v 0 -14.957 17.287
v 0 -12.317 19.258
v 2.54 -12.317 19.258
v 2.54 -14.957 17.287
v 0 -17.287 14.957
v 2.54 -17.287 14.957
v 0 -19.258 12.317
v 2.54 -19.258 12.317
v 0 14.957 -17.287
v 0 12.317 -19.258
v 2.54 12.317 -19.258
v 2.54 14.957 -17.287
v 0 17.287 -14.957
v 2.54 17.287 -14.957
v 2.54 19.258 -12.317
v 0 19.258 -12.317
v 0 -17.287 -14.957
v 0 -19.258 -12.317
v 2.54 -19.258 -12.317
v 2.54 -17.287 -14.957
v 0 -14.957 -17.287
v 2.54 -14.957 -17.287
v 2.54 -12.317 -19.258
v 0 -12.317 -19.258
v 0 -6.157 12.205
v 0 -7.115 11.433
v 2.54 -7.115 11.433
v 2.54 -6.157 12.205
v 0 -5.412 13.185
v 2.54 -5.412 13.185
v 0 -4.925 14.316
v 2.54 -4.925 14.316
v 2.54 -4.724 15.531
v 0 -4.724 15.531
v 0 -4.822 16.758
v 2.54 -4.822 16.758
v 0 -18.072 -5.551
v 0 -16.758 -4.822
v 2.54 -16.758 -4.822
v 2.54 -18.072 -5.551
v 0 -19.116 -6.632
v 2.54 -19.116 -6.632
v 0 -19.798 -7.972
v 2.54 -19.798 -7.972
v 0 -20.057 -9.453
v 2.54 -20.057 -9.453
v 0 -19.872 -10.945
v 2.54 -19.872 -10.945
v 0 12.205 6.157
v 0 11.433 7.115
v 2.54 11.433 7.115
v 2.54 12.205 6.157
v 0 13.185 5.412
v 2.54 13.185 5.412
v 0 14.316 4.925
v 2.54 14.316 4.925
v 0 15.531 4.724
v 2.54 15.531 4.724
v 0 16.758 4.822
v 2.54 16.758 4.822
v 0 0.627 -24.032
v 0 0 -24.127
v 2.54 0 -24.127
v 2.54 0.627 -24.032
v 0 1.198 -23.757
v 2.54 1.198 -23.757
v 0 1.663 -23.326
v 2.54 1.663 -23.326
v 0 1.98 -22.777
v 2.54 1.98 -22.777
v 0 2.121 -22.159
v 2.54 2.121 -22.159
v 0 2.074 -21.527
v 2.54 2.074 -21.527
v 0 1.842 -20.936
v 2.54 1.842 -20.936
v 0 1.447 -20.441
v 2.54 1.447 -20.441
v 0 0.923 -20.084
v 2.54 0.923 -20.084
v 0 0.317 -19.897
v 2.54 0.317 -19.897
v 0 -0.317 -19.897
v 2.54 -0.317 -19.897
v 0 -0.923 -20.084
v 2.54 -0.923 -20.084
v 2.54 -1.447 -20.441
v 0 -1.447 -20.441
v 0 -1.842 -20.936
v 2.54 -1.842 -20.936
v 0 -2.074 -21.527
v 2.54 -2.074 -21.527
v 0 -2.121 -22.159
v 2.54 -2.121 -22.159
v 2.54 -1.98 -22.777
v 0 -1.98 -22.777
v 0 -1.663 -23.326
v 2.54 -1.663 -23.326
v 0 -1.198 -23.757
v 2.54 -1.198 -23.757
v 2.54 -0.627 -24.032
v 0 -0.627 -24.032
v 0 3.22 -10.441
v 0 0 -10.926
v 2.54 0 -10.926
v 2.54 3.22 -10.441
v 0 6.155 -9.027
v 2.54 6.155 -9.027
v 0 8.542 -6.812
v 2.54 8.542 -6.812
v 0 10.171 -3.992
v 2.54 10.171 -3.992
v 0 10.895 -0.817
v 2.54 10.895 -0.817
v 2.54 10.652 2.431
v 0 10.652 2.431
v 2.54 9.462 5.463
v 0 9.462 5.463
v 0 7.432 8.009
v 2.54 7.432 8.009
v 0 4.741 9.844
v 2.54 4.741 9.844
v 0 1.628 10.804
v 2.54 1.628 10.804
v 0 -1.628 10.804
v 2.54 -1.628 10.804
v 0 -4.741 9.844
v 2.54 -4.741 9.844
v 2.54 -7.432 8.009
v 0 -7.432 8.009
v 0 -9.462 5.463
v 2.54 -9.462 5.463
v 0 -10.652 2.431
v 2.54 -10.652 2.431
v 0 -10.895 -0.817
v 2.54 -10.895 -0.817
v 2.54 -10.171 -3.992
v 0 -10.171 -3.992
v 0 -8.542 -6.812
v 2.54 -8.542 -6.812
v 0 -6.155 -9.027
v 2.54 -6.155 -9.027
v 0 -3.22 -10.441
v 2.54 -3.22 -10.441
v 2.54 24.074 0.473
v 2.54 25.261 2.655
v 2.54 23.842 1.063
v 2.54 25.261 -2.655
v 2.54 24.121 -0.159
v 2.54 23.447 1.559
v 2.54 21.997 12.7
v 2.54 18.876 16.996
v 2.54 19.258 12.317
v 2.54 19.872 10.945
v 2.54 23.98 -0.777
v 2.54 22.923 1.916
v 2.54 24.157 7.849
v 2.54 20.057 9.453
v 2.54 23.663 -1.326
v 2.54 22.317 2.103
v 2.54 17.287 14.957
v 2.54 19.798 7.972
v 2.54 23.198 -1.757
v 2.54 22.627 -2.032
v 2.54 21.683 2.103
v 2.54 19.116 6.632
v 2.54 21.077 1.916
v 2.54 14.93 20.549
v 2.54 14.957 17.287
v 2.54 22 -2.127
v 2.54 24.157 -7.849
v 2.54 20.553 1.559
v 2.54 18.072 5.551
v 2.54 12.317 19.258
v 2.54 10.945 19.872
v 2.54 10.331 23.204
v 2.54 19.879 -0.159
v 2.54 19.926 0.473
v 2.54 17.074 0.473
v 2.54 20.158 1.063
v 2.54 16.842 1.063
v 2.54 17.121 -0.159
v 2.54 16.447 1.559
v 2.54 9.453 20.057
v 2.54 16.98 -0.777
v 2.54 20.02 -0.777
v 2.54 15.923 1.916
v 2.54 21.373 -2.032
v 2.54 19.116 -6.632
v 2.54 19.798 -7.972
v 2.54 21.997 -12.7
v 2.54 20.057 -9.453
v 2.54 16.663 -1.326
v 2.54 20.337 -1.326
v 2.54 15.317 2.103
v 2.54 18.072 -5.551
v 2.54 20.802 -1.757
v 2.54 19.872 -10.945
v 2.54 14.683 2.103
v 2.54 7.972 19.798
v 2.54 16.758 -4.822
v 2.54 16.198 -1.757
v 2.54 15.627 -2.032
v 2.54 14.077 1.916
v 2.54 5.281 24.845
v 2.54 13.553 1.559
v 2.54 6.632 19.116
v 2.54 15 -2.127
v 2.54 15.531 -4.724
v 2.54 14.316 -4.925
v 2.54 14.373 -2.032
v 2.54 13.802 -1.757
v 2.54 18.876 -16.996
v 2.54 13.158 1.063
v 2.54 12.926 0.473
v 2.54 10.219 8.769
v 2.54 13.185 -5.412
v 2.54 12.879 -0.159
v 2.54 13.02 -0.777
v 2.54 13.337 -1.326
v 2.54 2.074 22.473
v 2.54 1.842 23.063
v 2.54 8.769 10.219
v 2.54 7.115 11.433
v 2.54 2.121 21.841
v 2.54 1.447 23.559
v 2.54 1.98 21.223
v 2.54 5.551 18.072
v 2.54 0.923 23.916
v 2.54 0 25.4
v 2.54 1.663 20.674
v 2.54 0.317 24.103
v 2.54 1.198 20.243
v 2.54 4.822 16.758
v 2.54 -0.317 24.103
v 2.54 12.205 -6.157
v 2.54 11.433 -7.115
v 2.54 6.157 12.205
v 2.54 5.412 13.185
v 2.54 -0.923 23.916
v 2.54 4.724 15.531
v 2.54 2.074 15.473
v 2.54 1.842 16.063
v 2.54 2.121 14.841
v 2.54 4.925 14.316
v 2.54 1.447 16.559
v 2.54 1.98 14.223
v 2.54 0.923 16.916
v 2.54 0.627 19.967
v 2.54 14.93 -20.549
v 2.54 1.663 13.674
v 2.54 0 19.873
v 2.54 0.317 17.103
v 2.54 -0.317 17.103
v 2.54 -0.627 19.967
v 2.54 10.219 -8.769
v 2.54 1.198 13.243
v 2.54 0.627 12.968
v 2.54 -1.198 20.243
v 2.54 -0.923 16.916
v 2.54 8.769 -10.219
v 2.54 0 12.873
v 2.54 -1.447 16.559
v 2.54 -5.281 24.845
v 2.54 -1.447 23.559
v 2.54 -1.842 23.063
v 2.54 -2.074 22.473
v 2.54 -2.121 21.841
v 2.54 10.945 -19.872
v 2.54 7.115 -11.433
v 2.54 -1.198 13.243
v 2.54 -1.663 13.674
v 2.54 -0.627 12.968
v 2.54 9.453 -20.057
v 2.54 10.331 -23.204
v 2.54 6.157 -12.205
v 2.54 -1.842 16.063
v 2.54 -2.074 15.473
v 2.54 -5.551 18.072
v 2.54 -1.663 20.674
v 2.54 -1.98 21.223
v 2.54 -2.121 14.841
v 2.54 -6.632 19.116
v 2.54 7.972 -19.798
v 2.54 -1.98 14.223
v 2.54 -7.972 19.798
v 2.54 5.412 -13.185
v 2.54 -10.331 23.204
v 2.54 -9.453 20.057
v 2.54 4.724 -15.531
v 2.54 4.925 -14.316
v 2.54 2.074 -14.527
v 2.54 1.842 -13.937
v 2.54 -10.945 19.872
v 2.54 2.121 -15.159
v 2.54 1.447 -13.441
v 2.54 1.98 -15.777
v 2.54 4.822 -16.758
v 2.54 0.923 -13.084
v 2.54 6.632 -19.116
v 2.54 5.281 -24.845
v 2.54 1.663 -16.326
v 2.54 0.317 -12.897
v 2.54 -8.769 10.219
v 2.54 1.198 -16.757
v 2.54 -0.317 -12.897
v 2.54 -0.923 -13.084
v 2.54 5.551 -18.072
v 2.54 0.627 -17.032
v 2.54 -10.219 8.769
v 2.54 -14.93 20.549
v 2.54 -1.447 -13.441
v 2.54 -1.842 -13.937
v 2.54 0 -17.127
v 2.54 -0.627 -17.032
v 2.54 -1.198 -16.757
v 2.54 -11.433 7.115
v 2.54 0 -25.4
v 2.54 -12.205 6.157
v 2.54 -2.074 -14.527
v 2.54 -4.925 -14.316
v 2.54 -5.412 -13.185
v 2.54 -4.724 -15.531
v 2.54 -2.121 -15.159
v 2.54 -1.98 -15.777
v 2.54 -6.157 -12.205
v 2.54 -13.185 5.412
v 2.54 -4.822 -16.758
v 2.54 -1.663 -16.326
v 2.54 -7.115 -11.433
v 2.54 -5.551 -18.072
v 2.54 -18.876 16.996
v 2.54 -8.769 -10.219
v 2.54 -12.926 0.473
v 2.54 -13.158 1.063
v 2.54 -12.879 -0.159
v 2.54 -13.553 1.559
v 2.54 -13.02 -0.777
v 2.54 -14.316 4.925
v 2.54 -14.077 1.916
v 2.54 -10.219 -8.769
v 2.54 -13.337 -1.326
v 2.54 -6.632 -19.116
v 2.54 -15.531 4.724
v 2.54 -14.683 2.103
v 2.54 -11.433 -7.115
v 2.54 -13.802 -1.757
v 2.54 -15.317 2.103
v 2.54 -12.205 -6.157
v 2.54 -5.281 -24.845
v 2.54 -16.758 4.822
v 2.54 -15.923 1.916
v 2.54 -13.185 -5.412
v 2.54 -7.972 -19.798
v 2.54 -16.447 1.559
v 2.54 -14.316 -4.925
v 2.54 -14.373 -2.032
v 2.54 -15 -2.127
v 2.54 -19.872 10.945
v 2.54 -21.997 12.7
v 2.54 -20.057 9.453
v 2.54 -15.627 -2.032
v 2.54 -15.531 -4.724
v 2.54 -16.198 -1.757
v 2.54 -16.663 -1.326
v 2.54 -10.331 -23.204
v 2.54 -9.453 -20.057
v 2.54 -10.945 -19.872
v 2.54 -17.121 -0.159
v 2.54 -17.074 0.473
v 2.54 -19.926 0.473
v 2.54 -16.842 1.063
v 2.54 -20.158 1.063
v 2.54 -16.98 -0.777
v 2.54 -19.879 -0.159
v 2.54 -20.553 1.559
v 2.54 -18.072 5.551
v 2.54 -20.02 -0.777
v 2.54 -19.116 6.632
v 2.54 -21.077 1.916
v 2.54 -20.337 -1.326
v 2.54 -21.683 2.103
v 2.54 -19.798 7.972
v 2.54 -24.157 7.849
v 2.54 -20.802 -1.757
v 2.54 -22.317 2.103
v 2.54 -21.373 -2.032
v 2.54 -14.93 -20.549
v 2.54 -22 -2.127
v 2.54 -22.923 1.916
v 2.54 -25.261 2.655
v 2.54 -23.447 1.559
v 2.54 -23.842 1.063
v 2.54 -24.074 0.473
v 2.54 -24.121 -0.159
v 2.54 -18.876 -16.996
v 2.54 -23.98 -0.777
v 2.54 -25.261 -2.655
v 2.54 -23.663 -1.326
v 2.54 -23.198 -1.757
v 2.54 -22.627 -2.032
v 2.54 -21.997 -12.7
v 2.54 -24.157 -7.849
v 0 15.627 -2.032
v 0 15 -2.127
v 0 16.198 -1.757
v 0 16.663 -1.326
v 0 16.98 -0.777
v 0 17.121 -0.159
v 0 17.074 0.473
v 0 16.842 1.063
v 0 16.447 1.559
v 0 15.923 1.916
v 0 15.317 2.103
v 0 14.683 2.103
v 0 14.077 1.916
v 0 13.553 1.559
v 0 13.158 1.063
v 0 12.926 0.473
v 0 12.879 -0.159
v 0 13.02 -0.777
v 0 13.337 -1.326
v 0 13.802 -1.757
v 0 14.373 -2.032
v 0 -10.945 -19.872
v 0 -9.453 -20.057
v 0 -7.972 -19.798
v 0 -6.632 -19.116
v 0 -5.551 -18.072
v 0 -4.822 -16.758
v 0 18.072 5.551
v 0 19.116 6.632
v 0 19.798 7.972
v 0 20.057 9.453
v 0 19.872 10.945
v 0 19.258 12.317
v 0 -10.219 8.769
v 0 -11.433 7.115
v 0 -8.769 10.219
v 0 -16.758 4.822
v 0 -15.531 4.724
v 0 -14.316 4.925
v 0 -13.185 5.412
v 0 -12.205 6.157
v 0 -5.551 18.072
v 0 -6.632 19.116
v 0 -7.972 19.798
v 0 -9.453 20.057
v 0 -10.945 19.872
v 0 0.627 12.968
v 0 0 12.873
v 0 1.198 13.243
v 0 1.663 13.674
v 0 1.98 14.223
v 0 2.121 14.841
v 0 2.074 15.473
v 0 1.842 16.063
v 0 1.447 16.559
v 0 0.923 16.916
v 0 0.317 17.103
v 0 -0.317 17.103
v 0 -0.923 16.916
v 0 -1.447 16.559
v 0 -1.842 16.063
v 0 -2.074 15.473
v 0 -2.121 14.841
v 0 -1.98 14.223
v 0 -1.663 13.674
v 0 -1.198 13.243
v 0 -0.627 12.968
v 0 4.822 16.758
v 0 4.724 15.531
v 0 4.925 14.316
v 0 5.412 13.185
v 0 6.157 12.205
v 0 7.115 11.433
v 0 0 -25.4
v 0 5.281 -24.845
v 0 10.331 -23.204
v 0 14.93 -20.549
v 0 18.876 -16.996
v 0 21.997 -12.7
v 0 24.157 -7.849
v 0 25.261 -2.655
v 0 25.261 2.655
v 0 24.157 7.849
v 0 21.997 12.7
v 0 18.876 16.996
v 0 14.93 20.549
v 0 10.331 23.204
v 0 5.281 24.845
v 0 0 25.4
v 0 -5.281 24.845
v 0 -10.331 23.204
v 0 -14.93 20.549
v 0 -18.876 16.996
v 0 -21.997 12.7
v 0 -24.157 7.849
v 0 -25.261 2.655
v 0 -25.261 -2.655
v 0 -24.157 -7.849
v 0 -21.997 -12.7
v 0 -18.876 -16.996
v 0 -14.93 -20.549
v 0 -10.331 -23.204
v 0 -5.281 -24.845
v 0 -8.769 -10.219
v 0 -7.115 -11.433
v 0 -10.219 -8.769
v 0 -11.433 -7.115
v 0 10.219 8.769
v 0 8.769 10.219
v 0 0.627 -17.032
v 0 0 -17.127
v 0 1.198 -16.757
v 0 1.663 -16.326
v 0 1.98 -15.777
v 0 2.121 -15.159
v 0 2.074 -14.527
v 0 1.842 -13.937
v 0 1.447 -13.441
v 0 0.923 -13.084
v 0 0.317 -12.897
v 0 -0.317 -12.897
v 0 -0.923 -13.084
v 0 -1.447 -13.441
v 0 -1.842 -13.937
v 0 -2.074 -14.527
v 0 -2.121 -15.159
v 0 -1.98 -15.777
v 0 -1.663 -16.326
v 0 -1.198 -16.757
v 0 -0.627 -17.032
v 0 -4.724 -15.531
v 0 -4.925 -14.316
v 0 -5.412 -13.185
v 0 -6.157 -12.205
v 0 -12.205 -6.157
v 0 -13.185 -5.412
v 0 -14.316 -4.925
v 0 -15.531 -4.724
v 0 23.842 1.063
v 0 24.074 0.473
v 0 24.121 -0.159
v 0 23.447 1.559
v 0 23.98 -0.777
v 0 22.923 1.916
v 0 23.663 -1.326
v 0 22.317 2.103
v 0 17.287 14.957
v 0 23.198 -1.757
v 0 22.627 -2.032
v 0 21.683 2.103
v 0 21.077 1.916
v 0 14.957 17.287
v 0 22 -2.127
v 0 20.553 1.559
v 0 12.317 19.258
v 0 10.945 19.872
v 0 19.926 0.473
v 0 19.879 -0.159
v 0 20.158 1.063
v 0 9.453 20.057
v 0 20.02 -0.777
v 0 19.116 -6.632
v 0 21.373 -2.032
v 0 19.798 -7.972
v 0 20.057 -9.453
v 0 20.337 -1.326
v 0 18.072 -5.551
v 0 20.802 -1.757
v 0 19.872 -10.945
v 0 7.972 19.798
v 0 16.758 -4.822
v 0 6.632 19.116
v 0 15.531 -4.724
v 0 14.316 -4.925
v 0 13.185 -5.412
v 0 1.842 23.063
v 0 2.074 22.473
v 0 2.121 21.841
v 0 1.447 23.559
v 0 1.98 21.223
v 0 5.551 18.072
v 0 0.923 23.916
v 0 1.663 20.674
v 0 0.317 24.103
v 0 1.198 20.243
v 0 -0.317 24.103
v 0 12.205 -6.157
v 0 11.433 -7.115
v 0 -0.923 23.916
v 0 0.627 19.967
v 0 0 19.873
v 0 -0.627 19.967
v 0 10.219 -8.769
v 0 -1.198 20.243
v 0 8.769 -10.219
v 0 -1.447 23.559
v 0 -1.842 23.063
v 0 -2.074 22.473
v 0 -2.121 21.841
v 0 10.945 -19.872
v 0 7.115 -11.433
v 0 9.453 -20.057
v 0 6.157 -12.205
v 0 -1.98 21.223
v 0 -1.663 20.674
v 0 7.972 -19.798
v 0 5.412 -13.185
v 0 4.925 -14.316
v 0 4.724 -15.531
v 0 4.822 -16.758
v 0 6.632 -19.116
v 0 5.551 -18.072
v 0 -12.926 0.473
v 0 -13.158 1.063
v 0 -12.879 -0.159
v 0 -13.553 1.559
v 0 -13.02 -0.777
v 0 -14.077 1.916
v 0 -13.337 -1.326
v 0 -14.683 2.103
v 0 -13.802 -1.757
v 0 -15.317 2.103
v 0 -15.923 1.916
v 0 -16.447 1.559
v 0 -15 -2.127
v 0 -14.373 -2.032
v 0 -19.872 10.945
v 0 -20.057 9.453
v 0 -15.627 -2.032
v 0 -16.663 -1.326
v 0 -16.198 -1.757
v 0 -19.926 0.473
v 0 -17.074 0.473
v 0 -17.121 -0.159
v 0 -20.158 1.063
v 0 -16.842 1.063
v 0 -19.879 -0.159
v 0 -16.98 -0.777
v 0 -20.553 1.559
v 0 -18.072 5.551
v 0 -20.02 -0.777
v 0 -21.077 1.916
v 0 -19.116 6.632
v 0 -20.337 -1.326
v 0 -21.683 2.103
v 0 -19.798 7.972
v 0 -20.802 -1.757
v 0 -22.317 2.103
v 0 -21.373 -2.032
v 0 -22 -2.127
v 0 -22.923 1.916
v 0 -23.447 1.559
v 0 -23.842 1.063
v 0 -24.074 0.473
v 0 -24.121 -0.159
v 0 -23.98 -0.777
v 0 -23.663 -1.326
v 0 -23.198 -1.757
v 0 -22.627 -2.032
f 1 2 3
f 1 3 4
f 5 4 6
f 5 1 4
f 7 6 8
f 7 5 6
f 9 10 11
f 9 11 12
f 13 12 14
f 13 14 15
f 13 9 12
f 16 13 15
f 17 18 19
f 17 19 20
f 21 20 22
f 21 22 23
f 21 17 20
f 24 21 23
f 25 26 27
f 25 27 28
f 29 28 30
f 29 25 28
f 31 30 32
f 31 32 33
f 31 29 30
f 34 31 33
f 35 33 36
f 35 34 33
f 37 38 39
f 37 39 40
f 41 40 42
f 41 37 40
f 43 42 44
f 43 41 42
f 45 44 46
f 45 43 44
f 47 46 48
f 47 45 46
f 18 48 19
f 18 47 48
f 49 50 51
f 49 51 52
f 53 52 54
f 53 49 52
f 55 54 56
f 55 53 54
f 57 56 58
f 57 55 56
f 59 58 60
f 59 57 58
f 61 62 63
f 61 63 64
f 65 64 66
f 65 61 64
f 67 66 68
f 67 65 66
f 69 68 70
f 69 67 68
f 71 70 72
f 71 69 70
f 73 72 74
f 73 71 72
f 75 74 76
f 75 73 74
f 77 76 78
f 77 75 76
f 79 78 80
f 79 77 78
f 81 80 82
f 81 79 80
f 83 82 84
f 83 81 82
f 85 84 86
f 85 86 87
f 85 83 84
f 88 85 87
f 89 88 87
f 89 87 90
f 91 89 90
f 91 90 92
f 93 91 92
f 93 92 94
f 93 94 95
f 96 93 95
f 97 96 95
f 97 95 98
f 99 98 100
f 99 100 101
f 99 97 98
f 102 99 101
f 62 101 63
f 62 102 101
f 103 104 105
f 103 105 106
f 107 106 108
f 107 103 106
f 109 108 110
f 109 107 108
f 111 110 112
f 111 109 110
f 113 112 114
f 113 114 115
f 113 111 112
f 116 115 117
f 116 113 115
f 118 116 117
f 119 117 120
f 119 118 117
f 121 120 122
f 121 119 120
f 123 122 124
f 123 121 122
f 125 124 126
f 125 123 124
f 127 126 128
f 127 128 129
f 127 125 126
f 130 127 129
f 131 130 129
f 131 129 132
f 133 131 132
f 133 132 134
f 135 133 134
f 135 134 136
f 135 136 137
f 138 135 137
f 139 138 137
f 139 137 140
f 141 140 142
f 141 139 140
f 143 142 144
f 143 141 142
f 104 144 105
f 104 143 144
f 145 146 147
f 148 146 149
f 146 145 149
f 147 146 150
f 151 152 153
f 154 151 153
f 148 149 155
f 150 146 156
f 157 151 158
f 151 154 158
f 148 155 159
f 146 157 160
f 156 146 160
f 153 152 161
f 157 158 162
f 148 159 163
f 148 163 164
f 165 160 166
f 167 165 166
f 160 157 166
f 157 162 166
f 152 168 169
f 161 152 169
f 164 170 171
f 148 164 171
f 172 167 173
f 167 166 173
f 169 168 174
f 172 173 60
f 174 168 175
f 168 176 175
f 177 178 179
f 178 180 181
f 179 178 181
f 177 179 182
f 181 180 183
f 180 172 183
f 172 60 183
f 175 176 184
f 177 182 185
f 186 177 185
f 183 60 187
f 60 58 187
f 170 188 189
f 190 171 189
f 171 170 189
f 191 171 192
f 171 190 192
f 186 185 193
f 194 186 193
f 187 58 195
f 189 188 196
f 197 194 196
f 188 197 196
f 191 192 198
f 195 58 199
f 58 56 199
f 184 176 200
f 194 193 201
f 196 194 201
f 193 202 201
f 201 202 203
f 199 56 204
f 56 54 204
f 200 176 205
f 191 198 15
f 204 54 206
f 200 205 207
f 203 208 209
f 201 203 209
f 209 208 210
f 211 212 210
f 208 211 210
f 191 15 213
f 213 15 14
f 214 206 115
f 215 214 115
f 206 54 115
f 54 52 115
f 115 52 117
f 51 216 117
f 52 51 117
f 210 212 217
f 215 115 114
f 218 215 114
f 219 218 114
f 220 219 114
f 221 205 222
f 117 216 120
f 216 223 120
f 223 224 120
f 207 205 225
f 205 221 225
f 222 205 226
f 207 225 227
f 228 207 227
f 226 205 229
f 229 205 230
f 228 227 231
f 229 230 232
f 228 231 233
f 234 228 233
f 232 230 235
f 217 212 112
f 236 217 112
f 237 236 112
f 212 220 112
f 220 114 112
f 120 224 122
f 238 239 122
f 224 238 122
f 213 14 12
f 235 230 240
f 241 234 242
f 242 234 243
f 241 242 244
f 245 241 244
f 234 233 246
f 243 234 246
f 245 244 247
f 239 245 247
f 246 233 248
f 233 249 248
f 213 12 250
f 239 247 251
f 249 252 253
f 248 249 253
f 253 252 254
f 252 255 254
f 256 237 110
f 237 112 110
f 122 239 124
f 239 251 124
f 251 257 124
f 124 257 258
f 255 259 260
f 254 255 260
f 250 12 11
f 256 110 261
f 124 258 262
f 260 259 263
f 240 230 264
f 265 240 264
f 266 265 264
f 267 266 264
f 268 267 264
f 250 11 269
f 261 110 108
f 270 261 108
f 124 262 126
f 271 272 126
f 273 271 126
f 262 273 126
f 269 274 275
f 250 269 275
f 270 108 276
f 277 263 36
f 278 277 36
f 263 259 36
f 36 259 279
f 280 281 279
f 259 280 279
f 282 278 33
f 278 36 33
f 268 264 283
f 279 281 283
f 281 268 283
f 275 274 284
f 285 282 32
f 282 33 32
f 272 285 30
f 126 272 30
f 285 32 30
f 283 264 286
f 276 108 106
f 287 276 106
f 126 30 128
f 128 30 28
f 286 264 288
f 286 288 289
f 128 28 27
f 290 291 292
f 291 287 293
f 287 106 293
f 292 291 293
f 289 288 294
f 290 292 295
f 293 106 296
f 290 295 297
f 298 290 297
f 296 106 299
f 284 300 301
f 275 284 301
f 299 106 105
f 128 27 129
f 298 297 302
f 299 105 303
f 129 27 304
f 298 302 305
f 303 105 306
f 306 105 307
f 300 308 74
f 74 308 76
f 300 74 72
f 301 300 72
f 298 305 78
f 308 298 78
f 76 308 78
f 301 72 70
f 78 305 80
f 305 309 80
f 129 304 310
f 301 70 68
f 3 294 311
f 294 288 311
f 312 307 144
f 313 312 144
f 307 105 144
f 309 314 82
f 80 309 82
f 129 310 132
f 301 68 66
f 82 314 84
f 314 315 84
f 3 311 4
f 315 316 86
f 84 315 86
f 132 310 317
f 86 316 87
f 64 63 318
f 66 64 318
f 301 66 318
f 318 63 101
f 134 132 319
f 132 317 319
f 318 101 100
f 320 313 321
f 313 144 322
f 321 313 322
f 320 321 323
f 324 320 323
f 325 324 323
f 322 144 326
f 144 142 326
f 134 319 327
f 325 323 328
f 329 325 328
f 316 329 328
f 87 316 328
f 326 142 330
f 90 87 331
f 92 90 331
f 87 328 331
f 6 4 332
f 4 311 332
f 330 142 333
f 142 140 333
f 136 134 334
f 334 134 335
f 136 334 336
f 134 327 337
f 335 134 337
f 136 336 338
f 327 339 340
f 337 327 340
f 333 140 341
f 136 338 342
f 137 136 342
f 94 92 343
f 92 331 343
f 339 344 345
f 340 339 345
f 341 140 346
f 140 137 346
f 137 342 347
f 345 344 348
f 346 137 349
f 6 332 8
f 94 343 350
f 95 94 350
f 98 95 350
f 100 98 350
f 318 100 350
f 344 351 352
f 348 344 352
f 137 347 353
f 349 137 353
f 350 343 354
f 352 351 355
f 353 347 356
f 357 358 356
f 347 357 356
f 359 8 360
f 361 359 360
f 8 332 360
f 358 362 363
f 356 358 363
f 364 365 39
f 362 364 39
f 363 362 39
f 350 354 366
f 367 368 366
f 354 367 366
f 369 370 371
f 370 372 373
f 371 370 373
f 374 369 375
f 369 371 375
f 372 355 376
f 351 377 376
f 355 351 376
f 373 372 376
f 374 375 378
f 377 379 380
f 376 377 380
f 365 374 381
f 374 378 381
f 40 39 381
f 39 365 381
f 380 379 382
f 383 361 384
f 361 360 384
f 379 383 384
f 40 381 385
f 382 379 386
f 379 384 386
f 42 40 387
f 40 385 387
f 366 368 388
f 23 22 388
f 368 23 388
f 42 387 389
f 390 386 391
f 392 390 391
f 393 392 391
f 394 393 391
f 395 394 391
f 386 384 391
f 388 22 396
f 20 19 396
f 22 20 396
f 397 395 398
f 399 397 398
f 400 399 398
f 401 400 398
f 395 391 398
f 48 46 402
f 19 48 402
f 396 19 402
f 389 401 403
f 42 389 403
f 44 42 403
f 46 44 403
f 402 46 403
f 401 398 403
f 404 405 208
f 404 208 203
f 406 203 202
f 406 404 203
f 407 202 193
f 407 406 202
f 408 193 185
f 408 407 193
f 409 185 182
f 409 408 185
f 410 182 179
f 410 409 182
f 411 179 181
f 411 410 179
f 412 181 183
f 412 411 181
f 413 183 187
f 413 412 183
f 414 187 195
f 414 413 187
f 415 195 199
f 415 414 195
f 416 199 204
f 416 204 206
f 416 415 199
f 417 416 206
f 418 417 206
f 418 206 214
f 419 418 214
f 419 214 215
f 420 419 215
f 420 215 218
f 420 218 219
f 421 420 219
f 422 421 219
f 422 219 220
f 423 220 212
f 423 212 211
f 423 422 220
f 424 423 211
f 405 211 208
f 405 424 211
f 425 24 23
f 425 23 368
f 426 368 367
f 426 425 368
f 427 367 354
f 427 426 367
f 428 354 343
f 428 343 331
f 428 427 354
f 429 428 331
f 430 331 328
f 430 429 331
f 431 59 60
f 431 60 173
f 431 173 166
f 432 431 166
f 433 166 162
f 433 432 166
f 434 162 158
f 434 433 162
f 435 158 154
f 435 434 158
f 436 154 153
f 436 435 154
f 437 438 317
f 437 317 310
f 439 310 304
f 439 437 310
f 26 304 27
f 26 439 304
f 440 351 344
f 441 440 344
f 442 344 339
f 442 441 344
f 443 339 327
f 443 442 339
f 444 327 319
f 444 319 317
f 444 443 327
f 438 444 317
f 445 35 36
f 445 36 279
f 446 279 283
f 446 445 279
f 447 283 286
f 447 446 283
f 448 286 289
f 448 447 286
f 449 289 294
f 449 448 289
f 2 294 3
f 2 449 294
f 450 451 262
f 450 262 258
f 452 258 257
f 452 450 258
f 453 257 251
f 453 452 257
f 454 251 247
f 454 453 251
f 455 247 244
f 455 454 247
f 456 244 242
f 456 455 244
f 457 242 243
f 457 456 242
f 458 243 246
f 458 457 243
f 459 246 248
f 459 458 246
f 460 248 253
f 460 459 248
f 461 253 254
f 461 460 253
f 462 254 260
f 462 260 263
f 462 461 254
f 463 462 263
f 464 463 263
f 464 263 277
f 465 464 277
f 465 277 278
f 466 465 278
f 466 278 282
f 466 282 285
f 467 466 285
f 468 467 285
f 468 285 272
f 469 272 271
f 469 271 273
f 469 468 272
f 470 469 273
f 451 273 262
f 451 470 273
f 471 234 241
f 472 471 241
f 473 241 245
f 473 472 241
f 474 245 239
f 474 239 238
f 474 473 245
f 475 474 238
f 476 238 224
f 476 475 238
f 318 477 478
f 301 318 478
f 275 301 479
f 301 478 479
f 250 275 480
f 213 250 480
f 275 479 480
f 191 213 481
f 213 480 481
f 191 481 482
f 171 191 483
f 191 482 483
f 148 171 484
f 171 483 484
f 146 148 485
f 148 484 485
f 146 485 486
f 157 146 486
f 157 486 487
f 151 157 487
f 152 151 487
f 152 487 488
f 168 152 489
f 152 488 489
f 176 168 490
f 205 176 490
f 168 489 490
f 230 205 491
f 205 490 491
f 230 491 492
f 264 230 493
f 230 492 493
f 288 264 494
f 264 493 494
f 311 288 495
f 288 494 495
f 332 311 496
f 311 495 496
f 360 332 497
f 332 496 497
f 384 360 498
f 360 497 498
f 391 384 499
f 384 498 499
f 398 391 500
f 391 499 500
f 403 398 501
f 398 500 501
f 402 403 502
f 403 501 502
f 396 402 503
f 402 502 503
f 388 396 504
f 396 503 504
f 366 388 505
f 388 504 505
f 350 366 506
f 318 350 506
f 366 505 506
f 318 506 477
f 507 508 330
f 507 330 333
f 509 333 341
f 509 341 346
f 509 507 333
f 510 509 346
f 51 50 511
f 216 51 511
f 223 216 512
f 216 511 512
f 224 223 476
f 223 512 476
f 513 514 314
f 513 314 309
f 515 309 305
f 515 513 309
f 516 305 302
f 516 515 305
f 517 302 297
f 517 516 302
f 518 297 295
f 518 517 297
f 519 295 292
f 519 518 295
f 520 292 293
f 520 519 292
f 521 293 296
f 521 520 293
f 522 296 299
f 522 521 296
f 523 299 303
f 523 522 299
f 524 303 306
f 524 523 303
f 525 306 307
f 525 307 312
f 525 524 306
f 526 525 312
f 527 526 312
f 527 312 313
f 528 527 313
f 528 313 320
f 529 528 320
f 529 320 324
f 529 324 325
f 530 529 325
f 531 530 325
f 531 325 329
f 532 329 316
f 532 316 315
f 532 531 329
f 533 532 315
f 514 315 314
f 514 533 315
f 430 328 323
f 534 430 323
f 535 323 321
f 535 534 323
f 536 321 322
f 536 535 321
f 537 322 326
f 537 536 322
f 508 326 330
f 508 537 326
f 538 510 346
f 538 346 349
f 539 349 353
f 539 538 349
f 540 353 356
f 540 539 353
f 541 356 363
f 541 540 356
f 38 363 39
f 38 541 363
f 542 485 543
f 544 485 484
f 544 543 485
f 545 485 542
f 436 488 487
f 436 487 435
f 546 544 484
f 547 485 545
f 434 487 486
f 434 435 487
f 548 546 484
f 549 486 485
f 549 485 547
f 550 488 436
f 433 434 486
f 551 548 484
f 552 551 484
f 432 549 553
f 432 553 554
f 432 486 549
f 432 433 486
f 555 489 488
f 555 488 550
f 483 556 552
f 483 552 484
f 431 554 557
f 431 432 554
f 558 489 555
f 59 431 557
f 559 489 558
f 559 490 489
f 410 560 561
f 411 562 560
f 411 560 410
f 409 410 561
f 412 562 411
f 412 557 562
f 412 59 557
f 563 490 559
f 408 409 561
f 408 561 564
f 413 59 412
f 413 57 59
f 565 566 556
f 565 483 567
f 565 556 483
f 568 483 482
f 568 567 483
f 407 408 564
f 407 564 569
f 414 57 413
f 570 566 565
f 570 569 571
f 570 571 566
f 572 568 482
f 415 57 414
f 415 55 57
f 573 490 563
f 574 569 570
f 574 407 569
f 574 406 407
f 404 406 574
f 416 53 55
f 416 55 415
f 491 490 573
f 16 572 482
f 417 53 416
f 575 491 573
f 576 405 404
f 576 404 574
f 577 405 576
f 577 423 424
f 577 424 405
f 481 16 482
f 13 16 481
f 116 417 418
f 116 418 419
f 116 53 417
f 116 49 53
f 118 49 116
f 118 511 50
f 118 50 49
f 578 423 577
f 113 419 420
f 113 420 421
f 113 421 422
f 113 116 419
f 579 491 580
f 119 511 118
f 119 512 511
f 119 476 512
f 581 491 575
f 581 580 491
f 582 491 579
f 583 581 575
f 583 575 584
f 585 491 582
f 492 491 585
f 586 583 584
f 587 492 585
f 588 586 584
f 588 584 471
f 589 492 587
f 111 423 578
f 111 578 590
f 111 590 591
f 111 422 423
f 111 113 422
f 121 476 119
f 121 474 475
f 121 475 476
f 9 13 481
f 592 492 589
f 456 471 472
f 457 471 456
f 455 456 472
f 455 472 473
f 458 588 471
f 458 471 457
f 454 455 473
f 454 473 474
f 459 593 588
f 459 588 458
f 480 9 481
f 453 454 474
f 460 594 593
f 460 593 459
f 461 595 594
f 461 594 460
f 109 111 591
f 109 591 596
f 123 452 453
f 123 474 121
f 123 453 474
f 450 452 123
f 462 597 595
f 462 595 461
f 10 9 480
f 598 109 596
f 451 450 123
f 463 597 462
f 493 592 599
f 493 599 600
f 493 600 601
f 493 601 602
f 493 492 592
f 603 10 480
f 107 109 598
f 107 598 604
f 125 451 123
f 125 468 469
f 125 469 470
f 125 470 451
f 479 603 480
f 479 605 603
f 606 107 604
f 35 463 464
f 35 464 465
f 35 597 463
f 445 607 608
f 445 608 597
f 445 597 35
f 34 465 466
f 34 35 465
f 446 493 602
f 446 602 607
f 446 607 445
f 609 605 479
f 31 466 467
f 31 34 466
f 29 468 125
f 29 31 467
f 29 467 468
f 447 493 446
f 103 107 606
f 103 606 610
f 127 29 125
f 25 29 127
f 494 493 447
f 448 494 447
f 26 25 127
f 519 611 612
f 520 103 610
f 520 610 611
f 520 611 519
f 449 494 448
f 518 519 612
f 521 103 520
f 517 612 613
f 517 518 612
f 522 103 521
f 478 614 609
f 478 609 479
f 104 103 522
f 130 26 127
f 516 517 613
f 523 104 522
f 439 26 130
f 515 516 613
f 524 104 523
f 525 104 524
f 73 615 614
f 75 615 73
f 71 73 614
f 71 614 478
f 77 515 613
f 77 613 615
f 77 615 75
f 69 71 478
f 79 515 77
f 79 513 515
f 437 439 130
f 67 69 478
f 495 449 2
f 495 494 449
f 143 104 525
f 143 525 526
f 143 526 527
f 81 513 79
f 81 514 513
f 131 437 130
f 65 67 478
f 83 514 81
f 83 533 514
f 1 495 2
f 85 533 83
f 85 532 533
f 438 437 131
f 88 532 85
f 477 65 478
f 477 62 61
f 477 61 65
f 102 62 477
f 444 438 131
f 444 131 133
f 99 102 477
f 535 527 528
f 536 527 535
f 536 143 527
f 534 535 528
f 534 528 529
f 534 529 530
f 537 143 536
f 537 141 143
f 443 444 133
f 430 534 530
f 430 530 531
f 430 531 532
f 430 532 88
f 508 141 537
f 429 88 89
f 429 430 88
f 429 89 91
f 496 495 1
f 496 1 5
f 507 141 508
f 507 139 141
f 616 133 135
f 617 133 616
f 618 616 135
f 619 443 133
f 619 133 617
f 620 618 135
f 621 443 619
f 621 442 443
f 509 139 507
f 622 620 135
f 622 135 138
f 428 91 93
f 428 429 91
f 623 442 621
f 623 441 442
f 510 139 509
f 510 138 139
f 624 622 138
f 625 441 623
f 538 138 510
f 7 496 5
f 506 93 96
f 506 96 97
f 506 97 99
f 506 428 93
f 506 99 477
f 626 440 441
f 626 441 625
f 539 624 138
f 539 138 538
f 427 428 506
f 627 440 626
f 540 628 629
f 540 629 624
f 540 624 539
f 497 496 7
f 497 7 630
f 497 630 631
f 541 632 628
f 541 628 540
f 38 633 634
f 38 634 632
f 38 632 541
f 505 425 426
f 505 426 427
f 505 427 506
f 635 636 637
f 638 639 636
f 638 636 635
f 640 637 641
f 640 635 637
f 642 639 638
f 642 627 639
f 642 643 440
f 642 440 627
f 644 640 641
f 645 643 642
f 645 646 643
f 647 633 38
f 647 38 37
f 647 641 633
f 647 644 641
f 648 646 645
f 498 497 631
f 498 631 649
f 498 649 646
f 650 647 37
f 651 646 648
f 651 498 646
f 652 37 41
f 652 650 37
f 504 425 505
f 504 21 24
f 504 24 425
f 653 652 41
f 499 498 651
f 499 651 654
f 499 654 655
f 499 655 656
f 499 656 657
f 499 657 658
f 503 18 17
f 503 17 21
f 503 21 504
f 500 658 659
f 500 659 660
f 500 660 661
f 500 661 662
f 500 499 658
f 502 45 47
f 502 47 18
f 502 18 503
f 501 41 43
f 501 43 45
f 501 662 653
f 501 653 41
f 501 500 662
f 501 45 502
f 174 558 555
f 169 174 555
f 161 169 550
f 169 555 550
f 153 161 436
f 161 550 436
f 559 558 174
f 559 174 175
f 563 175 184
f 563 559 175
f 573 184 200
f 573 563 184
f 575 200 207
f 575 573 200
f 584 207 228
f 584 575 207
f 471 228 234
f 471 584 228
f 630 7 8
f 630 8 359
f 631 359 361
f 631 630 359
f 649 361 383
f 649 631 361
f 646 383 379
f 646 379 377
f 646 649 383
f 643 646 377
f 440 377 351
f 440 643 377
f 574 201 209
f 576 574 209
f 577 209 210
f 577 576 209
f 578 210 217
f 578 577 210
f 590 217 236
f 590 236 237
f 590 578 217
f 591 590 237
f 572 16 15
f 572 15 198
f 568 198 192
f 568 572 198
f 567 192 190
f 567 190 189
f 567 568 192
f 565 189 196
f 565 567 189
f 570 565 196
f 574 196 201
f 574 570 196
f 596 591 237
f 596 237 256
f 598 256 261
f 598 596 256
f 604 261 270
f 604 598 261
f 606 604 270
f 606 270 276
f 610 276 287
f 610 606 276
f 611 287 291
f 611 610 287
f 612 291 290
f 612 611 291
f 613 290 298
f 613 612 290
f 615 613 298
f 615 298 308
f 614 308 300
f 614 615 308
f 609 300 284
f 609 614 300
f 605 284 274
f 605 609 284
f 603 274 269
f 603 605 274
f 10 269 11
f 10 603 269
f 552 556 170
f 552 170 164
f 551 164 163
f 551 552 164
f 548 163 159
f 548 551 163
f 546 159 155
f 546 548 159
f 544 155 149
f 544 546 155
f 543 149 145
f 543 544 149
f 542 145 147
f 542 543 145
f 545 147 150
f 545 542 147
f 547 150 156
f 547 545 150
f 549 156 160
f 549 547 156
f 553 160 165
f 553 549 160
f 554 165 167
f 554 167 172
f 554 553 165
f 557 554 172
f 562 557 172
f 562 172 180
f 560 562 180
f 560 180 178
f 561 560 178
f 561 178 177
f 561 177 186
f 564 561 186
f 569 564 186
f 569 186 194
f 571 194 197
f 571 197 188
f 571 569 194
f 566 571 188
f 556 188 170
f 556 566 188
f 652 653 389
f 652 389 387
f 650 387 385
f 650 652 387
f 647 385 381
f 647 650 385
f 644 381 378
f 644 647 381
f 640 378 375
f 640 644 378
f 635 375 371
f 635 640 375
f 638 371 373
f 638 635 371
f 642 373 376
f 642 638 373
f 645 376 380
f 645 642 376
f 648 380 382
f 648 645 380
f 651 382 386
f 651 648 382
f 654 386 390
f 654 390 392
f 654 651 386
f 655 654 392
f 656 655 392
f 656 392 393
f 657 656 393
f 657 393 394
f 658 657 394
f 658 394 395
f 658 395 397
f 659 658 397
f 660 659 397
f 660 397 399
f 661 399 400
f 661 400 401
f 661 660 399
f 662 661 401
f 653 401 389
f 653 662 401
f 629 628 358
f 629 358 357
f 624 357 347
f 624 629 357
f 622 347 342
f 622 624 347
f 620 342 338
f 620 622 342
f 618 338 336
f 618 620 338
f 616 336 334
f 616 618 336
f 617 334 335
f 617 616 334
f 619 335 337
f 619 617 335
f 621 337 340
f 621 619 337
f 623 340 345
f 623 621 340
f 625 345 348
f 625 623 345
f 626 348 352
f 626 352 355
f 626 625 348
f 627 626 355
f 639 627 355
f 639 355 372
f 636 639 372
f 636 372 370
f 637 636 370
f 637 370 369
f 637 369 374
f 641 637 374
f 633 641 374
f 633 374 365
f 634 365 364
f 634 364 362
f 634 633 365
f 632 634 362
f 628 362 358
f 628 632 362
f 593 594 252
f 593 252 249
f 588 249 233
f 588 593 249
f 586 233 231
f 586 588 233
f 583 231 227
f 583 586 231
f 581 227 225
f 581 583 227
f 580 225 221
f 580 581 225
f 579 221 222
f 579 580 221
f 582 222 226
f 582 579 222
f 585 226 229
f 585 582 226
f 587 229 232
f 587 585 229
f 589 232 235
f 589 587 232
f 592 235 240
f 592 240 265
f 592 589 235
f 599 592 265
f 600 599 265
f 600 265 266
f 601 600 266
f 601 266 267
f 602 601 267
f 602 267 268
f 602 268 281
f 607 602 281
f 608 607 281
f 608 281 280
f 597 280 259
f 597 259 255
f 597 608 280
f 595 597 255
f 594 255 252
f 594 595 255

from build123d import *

# Parameters (mm, degrees)
SKETCH1_R           = 25.4
SKETCH1_R_2         = 2.126996
SKETCH1_R_3         = 10.925995089
BOSS_EXTRUDE1_DEPTH = 2.54
FILLET1_R           = 5.08


with BuildPart() as part:
    # Sketch1 → Boss-Extrude1 (new body)
    with BuildSketch(Plane(origin=(0, 0, 0), x_dir=(0, 0, -1), z_dir=(1, 0, 0))):
        Circle(SKETCH1_R)
        with Locations((0, 21.9999941)):
            Circle(SKETCH1_R_2, mode=Mode.SUBTRACT)
        with Locations((14.999999972, 0)):
            Circle(SKETCH1_R_2, mode=Mode.SUBTRACT)
        with Locations((21.9999941, 0)):
            Circle(SKETCH1_R_2, mode=Mode.SUBTRACT)
        with Locations((0, -21.9999941)):
            Circle(SKETCH1_R_2, mode=Mode.SUBTRACT)
        with Locations((-21.9999941, 0)):
            Circle(SKETCH1_R_2, mode=Mode.SUBTRACT)
        with Locations((0, -14.999999972)):
            Circle(SKETCH1_R_2, mode=Mode.SUBTRACT)
        with Locations((-14.999999972, 0)):
            Circle(SKETCH1_R_2, mode=Mode.SUBTRACT)
        with Locations((0, 14.999999972)):
            Circle(SKETCH1_R_2, mode=Mode.SUBTRACT)
        Circle(SKETCH1_R_3, mode=Mode.SUBTRACT)
        with BuildLine():
            Line((12.944345277, 3.71173128), (21.974442369, 6.301069954))
            ThreePointArc((21.974442369, 6.301069954), (16.164461018, 16.164461018), (6.301069954, 21.974442369))
            Line((6.301069954, 21.974442369), (3.71173128, 12.944345277))
            ThreePointArc((3.71173128, 12.944345277), (9.521896443, 9.521896443), (12.944345277, 3.71173128))
        make_face(mode=Mode.SUBTRACT)
        with BuildLine():
            Line((-12.944345277, 3.71173128), (-21.974442369, 6.301069954))
            ThreePointArc((-21.974442369, 6.301069954), (-16.164461018, 16.164461018), (-6.301069954, 21.974442369))
            Line((-6.301069954, 21.974442369), (-3.71173128, 12.944345277))
            ThreePointArc((-3.71173128, 12.944345277), (-9.521896443, 9.521896443), (-12.944345277, 3.71173128))
        make_face(mode=Mode.SUBTRACT)
        with BuildLine():
            Line((3.71173128, -12.944345277), (6.301069954, -21.974442369))
            ThreePointArc((6.301069954, -21.974442369), (16.164461018, -16.164461018), (21.974442369, -6.301069954))
            Line((21.974442369, -6.301069954), (12.944345277, -3.71173128))
            ThreePointArc((12.944345277, -3.71173128), (9.521896443, -9.521896443), (3.71173128, -12.944345277))
        make_face(mode=Mode.SUBTRACT)
        with BuildLine():
            Line((-12.944345277, -3.71173128), (-21.974442369, -6.301069954))
            ThreePointArc((-21.974442369, -6.301069954), (-16.164461018, -16.164461018), (-6.301069954, -21.974442369))
            Line((-6.301069954, -21.974442369), (-3.71173128, -12.944345277))
            ThreePointArc((-3.71173128, -12.944345277), (-9.521896443, -9.521896443), (-12.944345277, -3.71173128))
        make_face(mode=Mode.SUBTRACT)
    extrude(amount=BOSS_EXTRUDE1_DEPTH)

    # Fillet1
    # the kernel refuses this fillet: 5.08 mm, written as the material it adds along each edge
    with BuildSketch(Plane(origin=(0, 6.301069954, -21.974442369), x_dir=(0, 0.911397711724722, 0.41152668329397635), z_dir=(1, 0, 0)), Plane(origin=(0, -21.974442369, -6.301069954), x_dir=(0, 0.4115266832939732, -0.9113977117247234), z_dir=(1, 0, 0)), Plane(origin=(0, -6.301069954, 21.974442369), x_dir=(0, -0.9113977117247248, -0.4115266832939699), z_dir=(1, 0, 0))) as fillet1_piece_1:
        with BuildLine():
            CenterArc((5.867179819, 5.026781091), FILLET1_R, 171.6992252, 106.601549599)
            Line((0.840398727, 5.760178569), (0, 0))
            ThreePointArc((0, 0), (3.300288648, -0.239485089), (6.600577296, 0))
        make_face()
    extrude(amount=2.54)
    with BuildSketch(Plane(origin=(0, 3.71173128, -12.944345277), x_dir=(0, 0.9139096848416328, 0.4059175876365389), z_dir=(1, 0, 0))) as fillet1_piece_2:
        with BuildLine():
            CenterArc((4.426790217, -5.031193515), FILLET1_R, 97.948640691, 74.102718618)
            Line((-0.604403297, -4.328703786), (0, 0))
            ThreePointArc((0, 0), (1.862150244, -0.12937557), (3.724300488, 0))
        make_face()
    extrude(amount=2.54)
    with BuildSketch(Plane(origin=(0, 12.944345277, -3.71173128), x_dir=(0, -0.40591758763655106, -0.9139096848416274), z_dir=(1, 0, 0)), Plane(origin=(0, -12.944345277, 3.71173128), x_dir=(0, 0.4059175876365596, 0.9139096848416237), z_dir=(1, 0, 0)), Plane(origin=(0, 3.71173128, 12.944345277), x_dir=(0, 0.9139096848416286, -0.4059175876365486), z_dir=(1, 0, 0))) as fillet1_piece_3:
        with BuildLine():
            CenterArc((4.426790217, 5.031193515), FILLET1_R, 187.948640691, 74.102718618)
            Line((-0.604403297, 4.328703786), (0, 0))
            ThreePointArc((0, 0), (1.862150244, 0.12937557), (3.724300488, 0))
        make_face()
    extrude(amount=2.54)
    with BuildSketch(Plane(origin=(0, 21.974442369, -6.301069954), x_dir=(0, -0.9612616959383177, 0.275637355817003), z_dir=(1, 0, 0)), Plane(origin=(0, -6.301069954, -21.974442369), x_dir=(0, 0.2756373558170063, 0.9612616959383169), z_dir=(1, 0, 0)), Plane(origin=(0, 6.301069954, 21.974442369), x_dir=(0, -0.27563735581699955, -0.9612616959383188), z_dir=(1, 0, 0))) as fillet1_piece_4:
        with BuildLine():
            CenterArc((5.821162011, 5.08), FILLET1_R, 163.398450401, 106.601549599)
            ThreePointArc((0.952922586, 6.531428571), (0.239485089, 3.300288648), (0, 0))
            Line((0, 0), (5.821162011, 0))
        make_face()
    extrude(amount=2.54)
    with BuildSketch(Plane(origin=(0, -3.71173128, -12.944345277), x_dir=(0, -0.2756373558170063, -0.9612616959383169), z_dir=(1, 0, 0))) as fillet1_piece_5:
        with BuildLine():
            CenterArc((4.370695575, -5.08), FILLET1_R, 90, 74.102718618)
            ThreePointArc((-0.515016307, -3.688518989), (-0.12937557, -1.862150244), (0, 0))
            Line((0, 0), (4.370695575, 0))
        make_face()
    extrude(amount=2.54)
    with BuildSketch(Plane(origin=(0, -12.944345277, -3.71173128), x_dir=(0, -0.9612616959383224, -0.2756373558169866), z_dir=(1, 0, 0)), Plane(origin=(0, -3.71173128, 12.944345277), x_dir=(0, -0.27563735581698295, 0.9612616959383236), z_dir=(1, 0, 0)), Plane(origin=(0, 12.944345277, 3.71173128), x_dir=(0, 0.9612616959383206, 0.2756373558169933), z_dir=(1, 0, 0))) as fillet1_piece_6:
        with BuildLine():
            CenterArc((4.370695575, 5.08), FILLET1_R, 195.897281382, 74.102718618)
            ThreePointArc((-0.515016307, 3.688518989), (-0.12937557, 1.862150244), (0, 0))
            Line((0, 0), (4.370695575, 0))
        make_face()
    extrude(amount=2.54)
    with BuildSketch(Plane(origin=(0, -21.974442369, 6.301069954), x_dir=(0, 0.41152668329399555, 0.9113977117247133), z_dir=(1, 0, 0))) as fillet1_piece_7:
        with BuildLine():
            CenterArc((5.867179819, -5.026781091), FILLET1_R, 81.6992252, 106.601549599)
            Line((0.840398727, -5.760178569), (0, 0))
            ThreePointArc((0, 0), (3.300288648, 0.239485089), (6.600577296, 0))
        make_face()
    extrude(amount=2.54)
    with BuildSketch(Plane(origin=(0, 21.974442369, 6.301069954), x_dir=(0, -0.9612616959383207, -0.27563735581699317), z_dir=(1, 0, 0))) as fillet1_piece_8:
        with BuildLine():
            CenterArc((5.821162011, -5.08), FILLET1_R, 90, 106.601549599)
            ThreePointArc((0.952922586, -6.531428571), (0.239485089, -3.300288648), (0, 0))
            Line((0, 0), (5.821162011, 0))
        make_face()
    extrude(amount=2.54)


solid = part.part
